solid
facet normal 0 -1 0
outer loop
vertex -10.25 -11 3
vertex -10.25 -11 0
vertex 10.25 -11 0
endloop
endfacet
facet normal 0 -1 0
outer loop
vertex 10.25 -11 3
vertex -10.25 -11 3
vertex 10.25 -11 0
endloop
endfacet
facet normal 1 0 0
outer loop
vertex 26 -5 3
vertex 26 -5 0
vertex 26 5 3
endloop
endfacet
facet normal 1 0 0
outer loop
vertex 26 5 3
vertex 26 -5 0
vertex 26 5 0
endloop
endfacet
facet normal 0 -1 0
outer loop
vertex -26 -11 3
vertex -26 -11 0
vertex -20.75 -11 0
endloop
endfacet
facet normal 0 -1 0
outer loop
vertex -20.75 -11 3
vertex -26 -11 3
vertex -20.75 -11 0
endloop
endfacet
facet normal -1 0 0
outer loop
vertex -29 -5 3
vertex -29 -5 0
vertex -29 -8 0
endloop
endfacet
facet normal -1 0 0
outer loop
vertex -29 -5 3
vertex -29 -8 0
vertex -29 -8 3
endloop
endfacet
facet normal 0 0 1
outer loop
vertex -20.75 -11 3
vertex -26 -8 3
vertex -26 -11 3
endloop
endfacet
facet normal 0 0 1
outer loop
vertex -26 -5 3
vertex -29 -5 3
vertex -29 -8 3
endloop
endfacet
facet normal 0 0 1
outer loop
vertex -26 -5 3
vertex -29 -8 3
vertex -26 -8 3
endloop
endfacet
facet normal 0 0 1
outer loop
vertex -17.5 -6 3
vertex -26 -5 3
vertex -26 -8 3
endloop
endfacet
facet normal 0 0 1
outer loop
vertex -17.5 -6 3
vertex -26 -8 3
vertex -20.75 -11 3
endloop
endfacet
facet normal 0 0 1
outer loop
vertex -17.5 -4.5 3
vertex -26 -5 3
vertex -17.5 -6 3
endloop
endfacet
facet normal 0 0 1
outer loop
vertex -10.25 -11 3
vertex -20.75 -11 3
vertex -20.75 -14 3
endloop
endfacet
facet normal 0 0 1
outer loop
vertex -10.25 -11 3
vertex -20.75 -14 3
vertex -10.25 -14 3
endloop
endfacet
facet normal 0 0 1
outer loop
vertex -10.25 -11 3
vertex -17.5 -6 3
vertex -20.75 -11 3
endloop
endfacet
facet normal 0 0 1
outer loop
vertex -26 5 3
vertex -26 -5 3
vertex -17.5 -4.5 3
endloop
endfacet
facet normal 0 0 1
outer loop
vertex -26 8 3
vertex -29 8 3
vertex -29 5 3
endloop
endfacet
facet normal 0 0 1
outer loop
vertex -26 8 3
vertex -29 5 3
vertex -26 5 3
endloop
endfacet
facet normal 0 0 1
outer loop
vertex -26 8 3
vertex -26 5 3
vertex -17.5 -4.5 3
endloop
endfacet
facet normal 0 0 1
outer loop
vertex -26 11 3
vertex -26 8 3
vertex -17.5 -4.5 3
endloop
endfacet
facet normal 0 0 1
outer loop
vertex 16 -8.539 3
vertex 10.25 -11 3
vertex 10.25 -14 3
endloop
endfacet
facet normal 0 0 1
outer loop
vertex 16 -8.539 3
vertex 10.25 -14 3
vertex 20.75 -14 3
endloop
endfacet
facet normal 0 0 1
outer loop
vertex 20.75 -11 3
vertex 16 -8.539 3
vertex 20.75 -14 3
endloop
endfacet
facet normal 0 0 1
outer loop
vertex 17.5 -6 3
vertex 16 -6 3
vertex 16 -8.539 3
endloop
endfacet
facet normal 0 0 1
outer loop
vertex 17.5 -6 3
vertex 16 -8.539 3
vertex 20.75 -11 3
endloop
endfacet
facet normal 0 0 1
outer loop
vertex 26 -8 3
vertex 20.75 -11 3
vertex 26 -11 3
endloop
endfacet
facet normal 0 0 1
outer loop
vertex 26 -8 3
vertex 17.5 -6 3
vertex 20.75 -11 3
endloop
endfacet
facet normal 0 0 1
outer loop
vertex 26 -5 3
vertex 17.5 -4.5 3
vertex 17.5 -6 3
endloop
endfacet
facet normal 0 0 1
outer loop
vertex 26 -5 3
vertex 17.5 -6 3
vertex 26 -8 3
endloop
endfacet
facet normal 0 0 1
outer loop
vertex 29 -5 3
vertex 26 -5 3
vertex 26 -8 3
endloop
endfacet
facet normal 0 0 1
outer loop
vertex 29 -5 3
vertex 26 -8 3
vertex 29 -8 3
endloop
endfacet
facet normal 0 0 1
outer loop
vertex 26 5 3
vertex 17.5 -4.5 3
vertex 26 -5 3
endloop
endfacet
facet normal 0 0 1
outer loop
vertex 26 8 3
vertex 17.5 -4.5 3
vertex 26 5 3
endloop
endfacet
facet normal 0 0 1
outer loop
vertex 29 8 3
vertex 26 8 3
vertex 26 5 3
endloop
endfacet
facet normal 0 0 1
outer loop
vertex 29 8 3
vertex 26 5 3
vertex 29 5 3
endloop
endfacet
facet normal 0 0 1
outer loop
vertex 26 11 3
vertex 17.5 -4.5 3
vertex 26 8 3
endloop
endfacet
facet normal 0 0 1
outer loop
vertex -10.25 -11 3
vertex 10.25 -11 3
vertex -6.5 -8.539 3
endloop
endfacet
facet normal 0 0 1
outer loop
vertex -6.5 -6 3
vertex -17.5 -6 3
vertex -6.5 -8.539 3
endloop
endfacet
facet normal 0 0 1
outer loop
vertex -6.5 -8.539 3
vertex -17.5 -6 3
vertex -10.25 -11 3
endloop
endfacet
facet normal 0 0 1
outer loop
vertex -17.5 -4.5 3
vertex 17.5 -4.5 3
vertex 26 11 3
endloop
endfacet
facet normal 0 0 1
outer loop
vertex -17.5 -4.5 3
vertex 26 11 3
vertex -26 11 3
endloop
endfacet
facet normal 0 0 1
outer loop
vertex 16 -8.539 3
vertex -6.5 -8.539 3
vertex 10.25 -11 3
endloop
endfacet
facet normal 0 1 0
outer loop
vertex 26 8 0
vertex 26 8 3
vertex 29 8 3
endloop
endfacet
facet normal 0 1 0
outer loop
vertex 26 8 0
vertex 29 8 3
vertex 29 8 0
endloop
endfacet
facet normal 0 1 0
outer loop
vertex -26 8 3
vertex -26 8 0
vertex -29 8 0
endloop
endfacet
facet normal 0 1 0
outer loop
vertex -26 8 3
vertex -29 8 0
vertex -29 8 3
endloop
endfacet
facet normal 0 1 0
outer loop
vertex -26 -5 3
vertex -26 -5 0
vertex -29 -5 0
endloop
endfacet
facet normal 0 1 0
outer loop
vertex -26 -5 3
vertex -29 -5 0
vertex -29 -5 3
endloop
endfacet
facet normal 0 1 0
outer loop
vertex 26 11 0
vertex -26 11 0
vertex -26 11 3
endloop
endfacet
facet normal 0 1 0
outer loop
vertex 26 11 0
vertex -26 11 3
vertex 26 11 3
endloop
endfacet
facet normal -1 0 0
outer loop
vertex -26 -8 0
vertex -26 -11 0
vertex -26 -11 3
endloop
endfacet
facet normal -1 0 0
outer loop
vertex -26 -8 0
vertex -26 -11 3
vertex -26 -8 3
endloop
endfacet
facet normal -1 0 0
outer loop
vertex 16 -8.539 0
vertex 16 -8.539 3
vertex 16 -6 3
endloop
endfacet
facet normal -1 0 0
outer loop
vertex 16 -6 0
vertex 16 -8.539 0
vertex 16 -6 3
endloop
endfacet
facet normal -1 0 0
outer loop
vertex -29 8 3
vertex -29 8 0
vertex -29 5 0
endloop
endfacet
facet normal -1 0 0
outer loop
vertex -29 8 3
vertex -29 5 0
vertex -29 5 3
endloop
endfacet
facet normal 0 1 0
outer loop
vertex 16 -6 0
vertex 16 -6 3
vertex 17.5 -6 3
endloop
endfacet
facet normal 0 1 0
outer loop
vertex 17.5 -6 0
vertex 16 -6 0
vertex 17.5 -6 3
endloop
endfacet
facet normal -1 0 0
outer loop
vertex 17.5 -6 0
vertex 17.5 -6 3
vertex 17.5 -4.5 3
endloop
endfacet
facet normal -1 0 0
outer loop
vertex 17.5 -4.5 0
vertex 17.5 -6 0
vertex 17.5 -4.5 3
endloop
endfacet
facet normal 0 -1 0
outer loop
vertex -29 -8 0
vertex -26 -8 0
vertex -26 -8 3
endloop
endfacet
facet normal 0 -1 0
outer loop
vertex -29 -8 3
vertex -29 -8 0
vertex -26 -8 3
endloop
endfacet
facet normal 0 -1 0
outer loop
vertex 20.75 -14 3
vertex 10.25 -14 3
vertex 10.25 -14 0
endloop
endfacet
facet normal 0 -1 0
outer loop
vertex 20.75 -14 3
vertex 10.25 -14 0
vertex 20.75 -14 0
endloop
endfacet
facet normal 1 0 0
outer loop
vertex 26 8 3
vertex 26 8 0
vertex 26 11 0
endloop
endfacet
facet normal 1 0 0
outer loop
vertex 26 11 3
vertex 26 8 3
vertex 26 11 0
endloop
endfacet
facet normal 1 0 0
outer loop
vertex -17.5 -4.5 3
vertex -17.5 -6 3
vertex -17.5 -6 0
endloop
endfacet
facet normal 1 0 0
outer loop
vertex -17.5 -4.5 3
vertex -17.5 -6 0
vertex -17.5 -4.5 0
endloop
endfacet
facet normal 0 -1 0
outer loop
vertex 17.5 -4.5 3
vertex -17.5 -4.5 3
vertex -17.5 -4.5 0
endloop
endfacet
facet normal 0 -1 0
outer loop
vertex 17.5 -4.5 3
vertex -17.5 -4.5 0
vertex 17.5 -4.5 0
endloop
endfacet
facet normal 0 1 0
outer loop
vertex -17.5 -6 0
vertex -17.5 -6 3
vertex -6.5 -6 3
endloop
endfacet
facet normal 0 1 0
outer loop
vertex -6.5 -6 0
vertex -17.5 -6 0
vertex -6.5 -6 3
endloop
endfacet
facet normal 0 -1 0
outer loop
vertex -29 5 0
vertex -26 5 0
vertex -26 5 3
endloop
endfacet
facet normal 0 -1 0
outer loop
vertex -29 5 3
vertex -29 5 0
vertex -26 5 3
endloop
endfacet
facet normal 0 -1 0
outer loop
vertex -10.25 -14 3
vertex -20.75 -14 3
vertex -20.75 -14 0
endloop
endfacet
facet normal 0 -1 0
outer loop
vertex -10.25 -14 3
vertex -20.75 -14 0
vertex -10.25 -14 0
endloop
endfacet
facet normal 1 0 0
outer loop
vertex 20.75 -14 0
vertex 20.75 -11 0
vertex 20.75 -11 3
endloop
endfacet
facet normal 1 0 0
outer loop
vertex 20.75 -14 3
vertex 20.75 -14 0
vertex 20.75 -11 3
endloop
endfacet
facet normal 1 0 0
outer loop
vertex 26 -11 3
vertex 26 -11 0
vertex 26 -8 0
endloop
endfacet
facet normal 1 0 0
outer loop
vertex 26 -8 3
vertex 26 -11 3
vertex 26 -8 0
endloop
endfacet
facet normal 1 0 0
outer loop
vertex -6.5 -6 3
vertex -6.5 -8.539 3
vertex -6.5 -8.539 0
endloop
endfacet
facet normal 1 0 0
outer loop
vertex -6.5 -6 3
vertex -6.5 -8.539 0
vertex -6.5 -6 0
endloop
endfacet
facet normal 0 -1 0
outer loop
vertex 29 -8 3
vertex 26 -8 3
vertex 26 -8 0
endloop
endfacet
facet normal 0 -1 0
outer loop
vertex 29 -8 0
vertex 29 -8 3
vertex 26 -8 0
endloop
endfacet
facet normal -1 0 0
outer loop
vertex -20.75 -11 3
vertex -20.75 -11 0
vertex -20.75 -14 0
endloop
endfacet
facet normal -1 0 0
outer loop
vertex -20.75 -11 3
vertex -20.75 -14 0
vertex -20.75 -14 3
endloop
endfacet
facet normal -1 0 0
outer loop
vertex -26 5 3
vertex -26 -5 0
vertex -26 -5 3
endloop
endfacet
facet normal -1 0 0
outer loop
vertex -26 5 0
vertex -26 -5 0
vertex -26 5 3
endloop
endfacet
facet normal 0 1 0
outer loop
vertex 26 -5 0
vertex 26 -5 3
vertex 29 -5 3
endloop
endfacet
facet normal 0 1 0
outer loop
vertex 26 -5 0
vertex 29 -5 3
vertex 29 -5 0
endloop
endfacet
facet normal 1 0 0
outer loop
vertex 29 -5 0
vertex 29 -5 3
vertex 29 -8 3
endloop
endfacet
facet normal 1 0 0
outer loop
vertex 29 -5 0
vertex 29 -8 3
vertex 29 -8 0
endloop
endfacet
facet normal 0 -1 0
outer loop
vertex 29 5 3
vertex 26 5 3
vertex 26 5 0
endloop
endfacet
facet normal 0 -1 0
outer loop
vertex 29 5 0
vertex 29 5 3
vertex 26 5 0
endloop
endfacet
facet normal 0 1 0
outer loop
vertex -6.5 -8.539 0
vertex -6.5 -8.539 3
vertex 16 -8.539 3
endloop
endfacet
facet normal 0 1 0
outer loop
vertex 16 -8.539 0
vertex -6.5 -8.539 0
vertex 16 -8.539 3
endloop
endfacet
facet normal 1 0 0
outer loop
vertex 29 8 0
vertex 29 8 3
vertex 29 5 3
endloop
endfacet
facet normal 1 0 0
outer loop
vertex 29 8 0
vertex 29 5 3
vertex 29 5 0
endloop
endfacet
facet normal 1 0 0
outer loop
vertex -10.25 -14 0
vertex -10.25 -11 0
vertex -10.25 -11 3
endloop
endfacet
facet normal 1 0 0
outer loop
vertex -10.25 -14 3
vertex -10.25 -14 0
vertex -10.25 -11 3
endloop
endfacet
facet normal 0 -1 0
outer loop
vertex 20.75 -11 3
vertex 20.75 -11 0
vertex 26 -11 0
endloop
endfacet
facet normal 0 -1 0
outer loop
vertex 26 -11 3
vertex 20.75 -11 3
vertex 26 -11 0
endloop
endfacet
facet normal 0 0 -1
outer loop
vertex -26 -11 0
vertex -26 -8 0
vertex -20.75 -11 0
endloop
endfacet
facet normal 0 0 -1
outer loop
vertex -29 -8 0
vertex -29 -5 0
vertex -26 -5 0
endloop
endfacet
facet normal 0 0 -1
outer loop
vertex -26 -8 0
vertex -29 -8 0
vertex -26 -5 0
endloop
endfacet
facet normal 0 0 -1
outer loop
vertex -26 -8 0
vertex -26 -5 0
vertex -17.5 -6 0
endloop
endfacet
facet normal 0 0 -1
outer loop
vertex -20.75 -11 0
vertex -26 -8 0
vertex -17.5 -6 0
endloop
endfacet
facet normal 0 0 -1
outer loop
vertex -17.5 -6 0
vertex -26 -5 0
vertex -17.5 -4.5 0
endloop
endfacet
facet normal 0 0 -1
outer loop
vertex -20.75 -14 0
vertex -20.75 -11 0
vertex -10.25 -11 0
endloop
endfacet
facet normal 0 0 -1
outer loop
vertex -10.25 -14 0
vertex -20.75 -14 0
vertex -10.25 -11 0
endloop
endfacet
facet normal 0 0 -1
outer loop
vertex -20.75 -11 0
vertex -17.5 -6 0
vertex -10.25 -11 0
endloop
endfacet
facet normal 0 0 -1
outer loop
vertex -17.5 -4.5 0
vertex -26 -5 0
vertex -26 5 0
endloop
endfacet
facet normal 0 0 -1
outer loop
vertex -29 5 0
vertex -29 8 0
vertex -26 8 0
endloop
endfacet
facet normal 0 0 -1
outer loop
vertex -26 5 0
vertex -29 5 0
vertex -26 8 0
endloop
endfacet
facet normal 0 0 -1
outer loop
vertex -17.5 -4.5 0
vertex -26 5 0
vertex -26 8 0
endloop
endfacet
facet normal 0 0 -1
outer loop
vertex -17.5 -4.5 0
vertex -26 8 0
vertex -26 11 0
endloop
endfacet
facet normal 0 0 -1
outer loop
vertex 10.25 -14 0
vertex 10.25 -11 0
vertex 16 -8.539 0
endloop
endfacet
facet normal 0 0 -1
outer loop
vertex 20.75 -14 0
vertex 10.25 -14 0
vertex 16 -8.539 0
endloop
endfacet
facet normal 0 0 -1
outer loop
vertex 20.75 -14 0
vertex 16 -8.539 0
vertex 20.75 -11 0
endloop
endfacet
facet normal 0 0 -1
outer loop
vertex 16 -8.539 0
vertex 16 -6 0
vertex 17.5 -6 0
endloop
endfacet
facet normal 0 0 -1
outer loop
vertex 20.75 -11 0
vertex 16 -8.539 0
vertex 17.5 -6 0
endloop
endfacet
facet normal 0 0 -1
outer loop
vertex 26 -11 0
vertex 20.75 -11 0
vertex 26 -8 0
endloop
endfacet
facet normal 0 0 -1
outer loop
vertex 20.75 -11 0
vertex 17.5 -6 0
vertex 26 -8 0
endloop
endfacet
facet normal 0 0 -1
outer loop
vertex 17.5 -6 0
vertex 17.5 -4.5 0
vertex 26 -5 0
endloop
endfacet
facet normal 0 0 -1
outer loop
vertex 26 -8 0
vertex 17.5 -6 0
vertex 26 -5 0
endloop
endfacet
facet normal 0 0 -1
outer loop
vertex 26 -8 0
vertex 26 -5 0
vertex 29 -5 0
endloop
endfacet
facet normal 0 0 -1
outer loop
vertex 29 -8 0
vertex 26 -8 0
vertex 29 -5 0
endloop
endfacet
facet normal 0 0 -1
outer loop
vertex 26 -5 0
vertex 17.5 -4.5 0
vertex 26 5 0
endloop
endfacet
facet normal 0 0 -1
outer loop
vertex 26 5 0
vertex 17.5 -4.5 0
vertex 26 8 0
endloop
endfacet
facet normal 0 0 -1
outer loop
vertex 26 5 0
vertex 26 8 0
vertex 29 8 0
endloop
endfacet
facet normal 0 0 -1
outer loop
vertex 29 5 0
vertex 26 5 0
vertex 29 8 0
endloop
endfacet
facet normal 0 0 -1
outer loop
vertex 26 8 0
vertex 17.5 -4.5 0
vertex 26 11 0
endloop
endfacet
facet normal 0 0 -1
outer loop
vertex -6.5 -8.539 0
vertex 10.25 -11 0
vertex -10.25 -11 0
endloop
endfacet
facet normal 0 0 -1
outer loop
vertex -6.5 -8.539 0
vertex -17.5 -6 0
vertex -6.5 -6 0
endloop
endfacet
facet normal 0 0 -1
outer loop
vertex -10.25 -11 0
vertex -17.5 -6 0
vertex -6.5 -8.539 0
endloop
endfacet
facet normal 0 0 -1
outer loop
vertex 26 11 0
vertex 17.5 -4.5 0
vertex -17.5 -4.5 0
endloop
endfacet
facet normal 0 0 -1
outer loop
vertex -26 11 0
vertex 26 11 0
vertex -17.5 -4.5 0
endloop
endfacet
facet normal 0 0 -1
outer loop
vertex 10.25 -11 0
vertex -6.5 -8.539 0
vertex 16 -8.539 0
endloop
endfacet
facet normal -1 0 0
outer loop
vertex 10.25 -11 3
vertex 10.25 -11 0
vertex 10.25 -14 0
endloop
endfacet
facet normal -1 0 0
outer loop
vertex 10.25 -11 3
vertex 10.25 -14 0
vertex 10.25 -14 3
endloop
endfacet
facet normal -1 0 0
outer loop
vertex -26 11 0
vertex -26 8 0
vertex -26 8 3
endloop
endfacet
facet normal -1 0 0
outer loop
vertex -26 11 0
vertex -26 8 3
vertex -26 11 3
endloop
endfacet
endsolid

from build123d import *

# Parameters (mm, degrees)
SKETCH1_W           = 52
SKETCH1_H           = 22
BOSS_EXTRUDE1_DEPTH = 3
SKETCH2_W           = 3
SKETCH2_H           = 3
BOSS_EXTRUDE2_DEPTH = 3
SKETCH3_W           = 3
SKETCH3_H           = 3
BOSS_EXTRUDE3_DEPTH = 3
SKETCH4_W           = 10.5
SKETCH4_H           = 3
BOSS_EXTRUDE4_DEPTH = 3
SKETCH5_W           = 35
SKETCH5_H           = 1.5
CUT_EXTRUDE1_DEPTH  = 3
SKETCH6_W           = 22.5
SKETCH6_H           = 2.539151914
CUT_EXTRUDE2_DEPTH  = 3


with BuildPart() as part:
    # Sketch1 → Boss-Extrude1 (new body)
    with BuildSketch(Plane.XY):
        Rectangle(SKETCH1_W, SKETCH1_H)
    extrude(amount=BOSS_EXTRUDE1_DEPTH)

    # Sketch2 → Boss-Extrude2 (add)
    with BuildSketch(Plane.ZY.offset(26)):
        with Locations((1.5, 6.5)):
            Rectangle(SKETCH2_W, SKETCH2_H)
        with Locations((1.5, -6.5)):
            Rectangle(SKETCH2_W, SKETCH2_H)
    extrude(amount=BOSS_EXTRUDE2_DEPTH)

    # Sketch3 → Boss-Extrude3 (add)
    with BuildSketch(Plane(origin=(26, 0, 0), x_dir=(0, 0, -1), z_dir=(1, 0, 0))):
        with Locations((-1.5, 6.5)):
            Rectangle(SKETCH3_W, SKETCH3_H)
        with Locations((-1.5, -6.5)):
            Rectangle(SKETCH3_W, SKETCH3_H)
    extrude(amount=BOSS_EXTRUDE3_DEPTH)

    # Sketch4 → Boss-Extrude4 (add)
    with BuildSketch(Plane.XZ.offset(11)):
        with Locations((-15.5, 1.5)):
            Rectangle(SKETCH4_W, SKETCH4_H)
        with Locations((15.5, 1.5)):
            Rectangle(SKETCH4_W, SKETCH4_H)
    extrude(amount=BOSS_EXTRUDE4_DEPTH)

    # Sketch5 → Cut-Extrude1 (cut)
    with BuildSketch(Plane.XY.offset(3)):
        with Locations((0, -5.25)):
            Rectangle(SKETCH5_W, SKETCH5_H)
    extrude(amount=-CUT_EXTRUDE1_DEPTH, mode=Mode.SUBTRACT)

    # Sketch6 → Cut-Extrude2 (cut)
    with BuildSketch(Plane.XY.offset(3)):
        with Locations((4.75, -7.269575957)):
            Rectangle(SKETCH6_W, SKETCH6_H)
    extrude(amount=-CUT_EXTRUDE2_DEPTH, mode=Mode.SUBTRACT)


solid = part.part
